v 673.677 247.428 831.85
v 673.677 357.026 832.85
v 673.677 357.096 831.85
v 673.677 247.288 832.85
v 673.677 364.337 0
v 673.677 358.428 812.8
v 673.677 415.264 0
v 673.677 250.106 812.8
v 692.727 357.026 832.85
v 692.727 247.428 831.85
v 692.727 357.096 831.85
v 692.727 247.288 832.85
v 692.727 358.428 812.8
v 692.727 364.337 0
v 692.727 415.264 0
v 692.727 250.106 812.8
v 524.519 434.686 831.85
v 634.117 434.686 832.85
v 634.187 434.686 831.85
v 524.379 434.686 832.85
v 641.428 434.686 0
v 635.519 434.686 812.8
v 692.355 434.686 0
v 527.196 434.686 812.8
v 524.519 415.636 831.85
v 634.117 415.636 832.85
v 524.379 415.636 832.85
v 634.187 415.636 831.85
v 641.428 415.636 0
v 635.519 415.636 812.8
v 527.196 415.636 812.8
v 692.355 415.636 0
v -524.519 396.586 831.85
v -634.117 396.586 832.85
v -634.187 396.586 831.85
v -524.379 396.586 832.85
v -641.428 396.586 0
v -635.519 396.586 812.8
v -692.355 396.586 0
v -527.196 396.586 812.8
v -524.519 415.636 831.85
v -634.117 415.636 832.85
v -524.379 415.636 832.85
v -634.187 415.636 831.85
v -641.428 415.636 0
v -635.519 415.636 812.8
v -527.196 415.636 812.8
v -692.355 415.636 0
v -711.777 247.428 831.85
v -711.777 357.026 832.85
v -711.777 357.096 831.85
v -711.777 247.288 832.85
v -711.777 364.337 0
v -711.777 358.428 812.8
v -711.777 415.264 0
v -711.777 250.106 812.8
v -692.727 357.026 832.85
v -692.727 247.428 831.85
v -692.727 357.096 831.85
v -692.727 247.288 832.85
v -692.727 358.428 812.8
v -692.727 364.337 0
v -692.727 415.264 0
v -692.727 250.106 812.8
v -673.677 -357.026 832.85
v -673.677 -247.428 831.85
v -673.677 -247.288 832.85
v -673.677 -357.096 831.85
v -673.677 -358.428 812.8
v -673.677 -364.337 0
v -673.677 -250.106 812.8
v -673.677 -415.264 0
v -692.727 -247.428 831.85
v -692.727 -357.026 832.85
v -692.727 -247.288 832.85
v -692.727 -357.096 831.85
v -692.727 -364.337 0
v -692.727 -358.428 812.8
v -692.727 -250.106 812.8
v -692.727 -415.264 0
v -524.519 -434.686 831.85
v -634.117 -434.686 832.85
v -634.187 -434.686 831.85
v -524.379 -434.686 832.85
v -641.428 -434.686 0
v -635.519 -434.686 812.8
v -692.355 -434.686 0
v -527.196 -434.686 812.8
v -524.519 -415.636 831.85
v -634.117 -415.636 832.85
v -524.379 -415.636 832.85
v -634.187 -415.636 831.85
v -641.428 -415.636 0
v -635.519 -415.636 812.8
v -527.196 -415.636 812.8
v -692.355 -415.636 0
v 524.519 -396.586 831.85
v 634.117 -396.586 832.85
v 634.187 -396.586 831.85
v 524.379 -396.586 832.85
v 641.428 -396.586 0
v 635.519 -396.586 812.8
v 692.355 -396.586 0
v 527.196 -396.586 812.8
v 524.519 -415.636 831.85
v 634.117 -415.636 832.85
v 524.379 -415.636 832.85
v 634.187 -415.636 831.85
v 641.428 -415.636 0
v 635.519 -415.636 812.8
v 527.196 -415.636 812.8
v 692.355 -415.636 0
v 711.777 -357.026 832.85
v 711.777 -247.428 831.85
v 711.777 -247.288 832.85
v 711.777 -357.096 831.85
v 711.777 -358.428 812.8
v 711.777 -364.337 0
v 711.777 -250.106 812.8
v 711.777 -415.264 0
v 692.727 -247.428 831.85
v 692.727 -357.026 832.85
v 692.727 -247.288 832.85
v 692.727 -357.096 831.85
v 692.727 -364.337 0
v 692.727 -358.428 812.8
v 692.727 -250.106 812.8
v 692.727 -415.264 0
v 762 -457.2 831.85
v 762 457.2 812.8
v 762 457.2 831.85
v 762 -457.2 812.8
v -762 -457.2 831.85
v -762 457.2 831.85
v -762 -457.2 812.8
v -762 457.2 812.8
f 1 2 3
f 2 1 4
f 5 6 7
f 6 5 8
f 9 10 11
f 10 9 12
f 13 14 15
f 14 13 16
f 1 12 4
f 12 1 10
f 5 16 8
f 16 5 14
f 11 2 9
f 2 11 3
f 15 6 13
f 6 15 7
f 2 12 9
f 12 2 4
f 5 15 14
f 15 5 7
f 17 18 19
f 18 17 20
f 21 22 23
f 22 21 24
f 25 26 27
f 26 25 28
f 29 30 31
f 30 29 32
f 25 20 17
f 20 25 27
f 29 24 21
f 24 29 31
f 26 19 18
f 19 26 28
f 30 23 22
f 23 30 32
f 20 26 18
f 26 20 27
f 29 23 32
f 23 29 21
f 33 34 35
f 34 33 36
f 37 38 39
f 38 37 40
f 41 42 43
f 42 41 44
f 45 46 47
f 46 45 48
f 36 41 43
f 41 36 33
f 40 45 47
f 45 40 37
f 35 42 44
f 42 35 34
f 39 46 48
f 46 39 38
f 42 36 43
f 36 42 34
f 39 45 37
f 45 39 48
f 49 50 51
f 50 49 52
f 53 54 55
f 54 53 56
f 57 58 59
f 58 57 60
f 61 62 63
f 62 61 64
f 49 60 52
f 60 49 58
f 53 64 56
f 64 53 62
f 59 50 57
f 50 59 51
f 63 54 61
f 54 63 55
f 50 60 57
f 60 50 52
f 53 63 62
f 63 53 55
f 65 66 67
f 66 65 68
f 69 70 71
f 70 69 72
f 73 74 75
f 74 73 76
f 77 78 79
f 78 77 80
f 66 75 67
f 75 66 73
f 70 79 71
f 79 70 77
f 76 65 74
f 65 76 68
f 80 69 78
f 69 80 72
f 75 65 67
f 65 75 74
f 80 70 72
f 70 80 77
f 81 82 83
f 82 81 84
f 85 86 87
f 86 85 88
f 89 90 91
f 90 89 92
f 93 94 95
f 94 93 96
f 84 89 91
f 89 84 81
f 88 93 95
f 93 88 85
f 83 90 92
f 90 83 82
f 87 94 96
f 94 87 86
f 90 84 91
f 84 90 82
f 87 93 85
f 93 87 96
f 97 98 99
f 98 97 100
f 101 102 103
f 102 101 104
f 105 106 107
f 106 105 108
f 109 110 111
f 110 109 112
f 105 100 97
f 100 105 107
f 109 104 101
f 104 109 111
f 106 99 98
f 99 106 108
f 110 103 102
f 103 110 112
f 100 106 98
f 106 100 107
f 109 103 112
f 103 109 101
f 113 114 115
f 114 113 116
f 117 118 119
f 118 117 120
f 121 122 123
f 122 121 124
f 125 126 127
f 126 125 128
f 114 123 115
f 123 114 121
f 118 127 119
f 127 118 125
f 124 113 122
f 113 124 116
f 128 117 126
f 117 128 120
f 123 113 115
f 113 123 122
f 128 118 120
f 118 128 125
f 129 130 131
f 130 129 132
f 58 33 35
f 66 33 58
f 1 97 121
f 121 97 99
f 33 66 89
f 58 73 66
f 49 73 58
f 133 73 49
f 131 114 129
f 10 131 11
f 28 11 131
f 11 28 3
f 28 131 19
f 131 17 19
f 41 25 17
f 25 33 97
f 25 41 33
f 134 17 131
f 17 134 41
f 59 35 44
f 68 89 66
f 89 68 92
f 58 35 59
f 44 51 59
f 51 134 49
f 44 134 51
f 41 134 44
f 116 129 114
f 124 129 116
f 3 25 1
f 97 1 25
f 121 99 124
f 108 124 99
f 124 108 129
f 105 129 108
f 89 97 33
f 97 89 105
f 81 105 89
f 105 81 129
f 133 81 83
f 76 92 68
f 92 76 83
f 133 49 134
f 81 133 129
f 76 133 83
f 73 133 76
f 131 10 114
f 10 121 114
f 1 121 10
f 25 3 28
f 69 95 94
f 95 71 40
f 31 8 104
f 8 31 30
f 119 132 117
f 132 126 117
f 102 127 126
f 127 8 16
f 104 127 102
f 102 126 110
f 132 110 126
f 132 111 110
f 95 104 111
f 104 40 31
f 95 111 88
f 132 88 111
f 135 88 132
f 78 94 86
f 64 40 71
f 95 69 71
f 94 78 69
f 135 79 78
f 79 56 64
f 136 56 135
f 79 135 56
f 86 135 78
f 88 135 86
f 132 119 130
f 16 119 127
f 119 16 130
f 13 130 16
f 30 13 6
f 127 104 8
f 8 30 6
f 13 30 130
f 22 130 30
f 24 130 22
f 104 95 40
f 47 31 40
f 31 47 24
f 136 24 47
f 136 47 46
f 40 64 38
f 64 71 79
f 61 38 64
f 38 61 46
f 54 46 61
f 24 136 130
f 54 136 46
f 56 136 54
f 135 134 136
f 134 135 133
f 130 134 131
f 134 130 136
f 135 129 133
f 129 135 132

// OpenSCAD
mms = 25.4;     // millimeters in inch

module top(thick, wide, deep){
    translate([0,0, thick/2]){
        cube([wide, deep, thick], center = true);
    }
}
module rotate_around(){
} 
module leg(thick, height, angle, plus){
    width = 8*mms;
    
    difference(){
        rotate([-angle*2,0,45*plus  + 45]){
            translate([0,-6*mms,0])
            intersection(){
                cube([thick, width, height*1.05]);
                rotate([angle, 0, 0]){
                    translate([-1*mms,6*mms,-2*mms]){
                       cube([thick*3, width, height*1.35, ]);
                    }
                }
            }
        }
        // trim top
        translate([0,0,height+thick+1]){
            top(thick*2, wide, deep);
        }
        // trim bottom
        translate([0,0,-thick]){
            top(thick, wide, deep);
        }
    }
}

module legs(thick, height, angle){
    for(i = [0:4]){
        rotate([0,0,90*i]){            
            d2 = (0 == (i % 2)) ? deep/2.2 : wide/2.2;
            w2 = (0 == (i % 2)) ? wide/2.2 : deep/2.2;

            translate([w2, d2, 0]){
                rotate([0,0,90])
                union(){
                    leg(thick, height, angle, 1);
                    leg(thick, height, angle, -1);
                }
            }
        }        
    }
}
module desk(thick, wide, deep, height){
    color("SaddleBrown"){
        translate([0,0,height]){
            top(thick, wide, deep);
        }
    }
    color("Tan"){
        legs(thick, height, 4);
    }
}

height = 32*mms;    
thick= .75*mms;
wide = 5*12*mms;
deep = 3*12*mms;



//leg(thick, wide, 6, 1);
desk(thick, wide, deep, height);
